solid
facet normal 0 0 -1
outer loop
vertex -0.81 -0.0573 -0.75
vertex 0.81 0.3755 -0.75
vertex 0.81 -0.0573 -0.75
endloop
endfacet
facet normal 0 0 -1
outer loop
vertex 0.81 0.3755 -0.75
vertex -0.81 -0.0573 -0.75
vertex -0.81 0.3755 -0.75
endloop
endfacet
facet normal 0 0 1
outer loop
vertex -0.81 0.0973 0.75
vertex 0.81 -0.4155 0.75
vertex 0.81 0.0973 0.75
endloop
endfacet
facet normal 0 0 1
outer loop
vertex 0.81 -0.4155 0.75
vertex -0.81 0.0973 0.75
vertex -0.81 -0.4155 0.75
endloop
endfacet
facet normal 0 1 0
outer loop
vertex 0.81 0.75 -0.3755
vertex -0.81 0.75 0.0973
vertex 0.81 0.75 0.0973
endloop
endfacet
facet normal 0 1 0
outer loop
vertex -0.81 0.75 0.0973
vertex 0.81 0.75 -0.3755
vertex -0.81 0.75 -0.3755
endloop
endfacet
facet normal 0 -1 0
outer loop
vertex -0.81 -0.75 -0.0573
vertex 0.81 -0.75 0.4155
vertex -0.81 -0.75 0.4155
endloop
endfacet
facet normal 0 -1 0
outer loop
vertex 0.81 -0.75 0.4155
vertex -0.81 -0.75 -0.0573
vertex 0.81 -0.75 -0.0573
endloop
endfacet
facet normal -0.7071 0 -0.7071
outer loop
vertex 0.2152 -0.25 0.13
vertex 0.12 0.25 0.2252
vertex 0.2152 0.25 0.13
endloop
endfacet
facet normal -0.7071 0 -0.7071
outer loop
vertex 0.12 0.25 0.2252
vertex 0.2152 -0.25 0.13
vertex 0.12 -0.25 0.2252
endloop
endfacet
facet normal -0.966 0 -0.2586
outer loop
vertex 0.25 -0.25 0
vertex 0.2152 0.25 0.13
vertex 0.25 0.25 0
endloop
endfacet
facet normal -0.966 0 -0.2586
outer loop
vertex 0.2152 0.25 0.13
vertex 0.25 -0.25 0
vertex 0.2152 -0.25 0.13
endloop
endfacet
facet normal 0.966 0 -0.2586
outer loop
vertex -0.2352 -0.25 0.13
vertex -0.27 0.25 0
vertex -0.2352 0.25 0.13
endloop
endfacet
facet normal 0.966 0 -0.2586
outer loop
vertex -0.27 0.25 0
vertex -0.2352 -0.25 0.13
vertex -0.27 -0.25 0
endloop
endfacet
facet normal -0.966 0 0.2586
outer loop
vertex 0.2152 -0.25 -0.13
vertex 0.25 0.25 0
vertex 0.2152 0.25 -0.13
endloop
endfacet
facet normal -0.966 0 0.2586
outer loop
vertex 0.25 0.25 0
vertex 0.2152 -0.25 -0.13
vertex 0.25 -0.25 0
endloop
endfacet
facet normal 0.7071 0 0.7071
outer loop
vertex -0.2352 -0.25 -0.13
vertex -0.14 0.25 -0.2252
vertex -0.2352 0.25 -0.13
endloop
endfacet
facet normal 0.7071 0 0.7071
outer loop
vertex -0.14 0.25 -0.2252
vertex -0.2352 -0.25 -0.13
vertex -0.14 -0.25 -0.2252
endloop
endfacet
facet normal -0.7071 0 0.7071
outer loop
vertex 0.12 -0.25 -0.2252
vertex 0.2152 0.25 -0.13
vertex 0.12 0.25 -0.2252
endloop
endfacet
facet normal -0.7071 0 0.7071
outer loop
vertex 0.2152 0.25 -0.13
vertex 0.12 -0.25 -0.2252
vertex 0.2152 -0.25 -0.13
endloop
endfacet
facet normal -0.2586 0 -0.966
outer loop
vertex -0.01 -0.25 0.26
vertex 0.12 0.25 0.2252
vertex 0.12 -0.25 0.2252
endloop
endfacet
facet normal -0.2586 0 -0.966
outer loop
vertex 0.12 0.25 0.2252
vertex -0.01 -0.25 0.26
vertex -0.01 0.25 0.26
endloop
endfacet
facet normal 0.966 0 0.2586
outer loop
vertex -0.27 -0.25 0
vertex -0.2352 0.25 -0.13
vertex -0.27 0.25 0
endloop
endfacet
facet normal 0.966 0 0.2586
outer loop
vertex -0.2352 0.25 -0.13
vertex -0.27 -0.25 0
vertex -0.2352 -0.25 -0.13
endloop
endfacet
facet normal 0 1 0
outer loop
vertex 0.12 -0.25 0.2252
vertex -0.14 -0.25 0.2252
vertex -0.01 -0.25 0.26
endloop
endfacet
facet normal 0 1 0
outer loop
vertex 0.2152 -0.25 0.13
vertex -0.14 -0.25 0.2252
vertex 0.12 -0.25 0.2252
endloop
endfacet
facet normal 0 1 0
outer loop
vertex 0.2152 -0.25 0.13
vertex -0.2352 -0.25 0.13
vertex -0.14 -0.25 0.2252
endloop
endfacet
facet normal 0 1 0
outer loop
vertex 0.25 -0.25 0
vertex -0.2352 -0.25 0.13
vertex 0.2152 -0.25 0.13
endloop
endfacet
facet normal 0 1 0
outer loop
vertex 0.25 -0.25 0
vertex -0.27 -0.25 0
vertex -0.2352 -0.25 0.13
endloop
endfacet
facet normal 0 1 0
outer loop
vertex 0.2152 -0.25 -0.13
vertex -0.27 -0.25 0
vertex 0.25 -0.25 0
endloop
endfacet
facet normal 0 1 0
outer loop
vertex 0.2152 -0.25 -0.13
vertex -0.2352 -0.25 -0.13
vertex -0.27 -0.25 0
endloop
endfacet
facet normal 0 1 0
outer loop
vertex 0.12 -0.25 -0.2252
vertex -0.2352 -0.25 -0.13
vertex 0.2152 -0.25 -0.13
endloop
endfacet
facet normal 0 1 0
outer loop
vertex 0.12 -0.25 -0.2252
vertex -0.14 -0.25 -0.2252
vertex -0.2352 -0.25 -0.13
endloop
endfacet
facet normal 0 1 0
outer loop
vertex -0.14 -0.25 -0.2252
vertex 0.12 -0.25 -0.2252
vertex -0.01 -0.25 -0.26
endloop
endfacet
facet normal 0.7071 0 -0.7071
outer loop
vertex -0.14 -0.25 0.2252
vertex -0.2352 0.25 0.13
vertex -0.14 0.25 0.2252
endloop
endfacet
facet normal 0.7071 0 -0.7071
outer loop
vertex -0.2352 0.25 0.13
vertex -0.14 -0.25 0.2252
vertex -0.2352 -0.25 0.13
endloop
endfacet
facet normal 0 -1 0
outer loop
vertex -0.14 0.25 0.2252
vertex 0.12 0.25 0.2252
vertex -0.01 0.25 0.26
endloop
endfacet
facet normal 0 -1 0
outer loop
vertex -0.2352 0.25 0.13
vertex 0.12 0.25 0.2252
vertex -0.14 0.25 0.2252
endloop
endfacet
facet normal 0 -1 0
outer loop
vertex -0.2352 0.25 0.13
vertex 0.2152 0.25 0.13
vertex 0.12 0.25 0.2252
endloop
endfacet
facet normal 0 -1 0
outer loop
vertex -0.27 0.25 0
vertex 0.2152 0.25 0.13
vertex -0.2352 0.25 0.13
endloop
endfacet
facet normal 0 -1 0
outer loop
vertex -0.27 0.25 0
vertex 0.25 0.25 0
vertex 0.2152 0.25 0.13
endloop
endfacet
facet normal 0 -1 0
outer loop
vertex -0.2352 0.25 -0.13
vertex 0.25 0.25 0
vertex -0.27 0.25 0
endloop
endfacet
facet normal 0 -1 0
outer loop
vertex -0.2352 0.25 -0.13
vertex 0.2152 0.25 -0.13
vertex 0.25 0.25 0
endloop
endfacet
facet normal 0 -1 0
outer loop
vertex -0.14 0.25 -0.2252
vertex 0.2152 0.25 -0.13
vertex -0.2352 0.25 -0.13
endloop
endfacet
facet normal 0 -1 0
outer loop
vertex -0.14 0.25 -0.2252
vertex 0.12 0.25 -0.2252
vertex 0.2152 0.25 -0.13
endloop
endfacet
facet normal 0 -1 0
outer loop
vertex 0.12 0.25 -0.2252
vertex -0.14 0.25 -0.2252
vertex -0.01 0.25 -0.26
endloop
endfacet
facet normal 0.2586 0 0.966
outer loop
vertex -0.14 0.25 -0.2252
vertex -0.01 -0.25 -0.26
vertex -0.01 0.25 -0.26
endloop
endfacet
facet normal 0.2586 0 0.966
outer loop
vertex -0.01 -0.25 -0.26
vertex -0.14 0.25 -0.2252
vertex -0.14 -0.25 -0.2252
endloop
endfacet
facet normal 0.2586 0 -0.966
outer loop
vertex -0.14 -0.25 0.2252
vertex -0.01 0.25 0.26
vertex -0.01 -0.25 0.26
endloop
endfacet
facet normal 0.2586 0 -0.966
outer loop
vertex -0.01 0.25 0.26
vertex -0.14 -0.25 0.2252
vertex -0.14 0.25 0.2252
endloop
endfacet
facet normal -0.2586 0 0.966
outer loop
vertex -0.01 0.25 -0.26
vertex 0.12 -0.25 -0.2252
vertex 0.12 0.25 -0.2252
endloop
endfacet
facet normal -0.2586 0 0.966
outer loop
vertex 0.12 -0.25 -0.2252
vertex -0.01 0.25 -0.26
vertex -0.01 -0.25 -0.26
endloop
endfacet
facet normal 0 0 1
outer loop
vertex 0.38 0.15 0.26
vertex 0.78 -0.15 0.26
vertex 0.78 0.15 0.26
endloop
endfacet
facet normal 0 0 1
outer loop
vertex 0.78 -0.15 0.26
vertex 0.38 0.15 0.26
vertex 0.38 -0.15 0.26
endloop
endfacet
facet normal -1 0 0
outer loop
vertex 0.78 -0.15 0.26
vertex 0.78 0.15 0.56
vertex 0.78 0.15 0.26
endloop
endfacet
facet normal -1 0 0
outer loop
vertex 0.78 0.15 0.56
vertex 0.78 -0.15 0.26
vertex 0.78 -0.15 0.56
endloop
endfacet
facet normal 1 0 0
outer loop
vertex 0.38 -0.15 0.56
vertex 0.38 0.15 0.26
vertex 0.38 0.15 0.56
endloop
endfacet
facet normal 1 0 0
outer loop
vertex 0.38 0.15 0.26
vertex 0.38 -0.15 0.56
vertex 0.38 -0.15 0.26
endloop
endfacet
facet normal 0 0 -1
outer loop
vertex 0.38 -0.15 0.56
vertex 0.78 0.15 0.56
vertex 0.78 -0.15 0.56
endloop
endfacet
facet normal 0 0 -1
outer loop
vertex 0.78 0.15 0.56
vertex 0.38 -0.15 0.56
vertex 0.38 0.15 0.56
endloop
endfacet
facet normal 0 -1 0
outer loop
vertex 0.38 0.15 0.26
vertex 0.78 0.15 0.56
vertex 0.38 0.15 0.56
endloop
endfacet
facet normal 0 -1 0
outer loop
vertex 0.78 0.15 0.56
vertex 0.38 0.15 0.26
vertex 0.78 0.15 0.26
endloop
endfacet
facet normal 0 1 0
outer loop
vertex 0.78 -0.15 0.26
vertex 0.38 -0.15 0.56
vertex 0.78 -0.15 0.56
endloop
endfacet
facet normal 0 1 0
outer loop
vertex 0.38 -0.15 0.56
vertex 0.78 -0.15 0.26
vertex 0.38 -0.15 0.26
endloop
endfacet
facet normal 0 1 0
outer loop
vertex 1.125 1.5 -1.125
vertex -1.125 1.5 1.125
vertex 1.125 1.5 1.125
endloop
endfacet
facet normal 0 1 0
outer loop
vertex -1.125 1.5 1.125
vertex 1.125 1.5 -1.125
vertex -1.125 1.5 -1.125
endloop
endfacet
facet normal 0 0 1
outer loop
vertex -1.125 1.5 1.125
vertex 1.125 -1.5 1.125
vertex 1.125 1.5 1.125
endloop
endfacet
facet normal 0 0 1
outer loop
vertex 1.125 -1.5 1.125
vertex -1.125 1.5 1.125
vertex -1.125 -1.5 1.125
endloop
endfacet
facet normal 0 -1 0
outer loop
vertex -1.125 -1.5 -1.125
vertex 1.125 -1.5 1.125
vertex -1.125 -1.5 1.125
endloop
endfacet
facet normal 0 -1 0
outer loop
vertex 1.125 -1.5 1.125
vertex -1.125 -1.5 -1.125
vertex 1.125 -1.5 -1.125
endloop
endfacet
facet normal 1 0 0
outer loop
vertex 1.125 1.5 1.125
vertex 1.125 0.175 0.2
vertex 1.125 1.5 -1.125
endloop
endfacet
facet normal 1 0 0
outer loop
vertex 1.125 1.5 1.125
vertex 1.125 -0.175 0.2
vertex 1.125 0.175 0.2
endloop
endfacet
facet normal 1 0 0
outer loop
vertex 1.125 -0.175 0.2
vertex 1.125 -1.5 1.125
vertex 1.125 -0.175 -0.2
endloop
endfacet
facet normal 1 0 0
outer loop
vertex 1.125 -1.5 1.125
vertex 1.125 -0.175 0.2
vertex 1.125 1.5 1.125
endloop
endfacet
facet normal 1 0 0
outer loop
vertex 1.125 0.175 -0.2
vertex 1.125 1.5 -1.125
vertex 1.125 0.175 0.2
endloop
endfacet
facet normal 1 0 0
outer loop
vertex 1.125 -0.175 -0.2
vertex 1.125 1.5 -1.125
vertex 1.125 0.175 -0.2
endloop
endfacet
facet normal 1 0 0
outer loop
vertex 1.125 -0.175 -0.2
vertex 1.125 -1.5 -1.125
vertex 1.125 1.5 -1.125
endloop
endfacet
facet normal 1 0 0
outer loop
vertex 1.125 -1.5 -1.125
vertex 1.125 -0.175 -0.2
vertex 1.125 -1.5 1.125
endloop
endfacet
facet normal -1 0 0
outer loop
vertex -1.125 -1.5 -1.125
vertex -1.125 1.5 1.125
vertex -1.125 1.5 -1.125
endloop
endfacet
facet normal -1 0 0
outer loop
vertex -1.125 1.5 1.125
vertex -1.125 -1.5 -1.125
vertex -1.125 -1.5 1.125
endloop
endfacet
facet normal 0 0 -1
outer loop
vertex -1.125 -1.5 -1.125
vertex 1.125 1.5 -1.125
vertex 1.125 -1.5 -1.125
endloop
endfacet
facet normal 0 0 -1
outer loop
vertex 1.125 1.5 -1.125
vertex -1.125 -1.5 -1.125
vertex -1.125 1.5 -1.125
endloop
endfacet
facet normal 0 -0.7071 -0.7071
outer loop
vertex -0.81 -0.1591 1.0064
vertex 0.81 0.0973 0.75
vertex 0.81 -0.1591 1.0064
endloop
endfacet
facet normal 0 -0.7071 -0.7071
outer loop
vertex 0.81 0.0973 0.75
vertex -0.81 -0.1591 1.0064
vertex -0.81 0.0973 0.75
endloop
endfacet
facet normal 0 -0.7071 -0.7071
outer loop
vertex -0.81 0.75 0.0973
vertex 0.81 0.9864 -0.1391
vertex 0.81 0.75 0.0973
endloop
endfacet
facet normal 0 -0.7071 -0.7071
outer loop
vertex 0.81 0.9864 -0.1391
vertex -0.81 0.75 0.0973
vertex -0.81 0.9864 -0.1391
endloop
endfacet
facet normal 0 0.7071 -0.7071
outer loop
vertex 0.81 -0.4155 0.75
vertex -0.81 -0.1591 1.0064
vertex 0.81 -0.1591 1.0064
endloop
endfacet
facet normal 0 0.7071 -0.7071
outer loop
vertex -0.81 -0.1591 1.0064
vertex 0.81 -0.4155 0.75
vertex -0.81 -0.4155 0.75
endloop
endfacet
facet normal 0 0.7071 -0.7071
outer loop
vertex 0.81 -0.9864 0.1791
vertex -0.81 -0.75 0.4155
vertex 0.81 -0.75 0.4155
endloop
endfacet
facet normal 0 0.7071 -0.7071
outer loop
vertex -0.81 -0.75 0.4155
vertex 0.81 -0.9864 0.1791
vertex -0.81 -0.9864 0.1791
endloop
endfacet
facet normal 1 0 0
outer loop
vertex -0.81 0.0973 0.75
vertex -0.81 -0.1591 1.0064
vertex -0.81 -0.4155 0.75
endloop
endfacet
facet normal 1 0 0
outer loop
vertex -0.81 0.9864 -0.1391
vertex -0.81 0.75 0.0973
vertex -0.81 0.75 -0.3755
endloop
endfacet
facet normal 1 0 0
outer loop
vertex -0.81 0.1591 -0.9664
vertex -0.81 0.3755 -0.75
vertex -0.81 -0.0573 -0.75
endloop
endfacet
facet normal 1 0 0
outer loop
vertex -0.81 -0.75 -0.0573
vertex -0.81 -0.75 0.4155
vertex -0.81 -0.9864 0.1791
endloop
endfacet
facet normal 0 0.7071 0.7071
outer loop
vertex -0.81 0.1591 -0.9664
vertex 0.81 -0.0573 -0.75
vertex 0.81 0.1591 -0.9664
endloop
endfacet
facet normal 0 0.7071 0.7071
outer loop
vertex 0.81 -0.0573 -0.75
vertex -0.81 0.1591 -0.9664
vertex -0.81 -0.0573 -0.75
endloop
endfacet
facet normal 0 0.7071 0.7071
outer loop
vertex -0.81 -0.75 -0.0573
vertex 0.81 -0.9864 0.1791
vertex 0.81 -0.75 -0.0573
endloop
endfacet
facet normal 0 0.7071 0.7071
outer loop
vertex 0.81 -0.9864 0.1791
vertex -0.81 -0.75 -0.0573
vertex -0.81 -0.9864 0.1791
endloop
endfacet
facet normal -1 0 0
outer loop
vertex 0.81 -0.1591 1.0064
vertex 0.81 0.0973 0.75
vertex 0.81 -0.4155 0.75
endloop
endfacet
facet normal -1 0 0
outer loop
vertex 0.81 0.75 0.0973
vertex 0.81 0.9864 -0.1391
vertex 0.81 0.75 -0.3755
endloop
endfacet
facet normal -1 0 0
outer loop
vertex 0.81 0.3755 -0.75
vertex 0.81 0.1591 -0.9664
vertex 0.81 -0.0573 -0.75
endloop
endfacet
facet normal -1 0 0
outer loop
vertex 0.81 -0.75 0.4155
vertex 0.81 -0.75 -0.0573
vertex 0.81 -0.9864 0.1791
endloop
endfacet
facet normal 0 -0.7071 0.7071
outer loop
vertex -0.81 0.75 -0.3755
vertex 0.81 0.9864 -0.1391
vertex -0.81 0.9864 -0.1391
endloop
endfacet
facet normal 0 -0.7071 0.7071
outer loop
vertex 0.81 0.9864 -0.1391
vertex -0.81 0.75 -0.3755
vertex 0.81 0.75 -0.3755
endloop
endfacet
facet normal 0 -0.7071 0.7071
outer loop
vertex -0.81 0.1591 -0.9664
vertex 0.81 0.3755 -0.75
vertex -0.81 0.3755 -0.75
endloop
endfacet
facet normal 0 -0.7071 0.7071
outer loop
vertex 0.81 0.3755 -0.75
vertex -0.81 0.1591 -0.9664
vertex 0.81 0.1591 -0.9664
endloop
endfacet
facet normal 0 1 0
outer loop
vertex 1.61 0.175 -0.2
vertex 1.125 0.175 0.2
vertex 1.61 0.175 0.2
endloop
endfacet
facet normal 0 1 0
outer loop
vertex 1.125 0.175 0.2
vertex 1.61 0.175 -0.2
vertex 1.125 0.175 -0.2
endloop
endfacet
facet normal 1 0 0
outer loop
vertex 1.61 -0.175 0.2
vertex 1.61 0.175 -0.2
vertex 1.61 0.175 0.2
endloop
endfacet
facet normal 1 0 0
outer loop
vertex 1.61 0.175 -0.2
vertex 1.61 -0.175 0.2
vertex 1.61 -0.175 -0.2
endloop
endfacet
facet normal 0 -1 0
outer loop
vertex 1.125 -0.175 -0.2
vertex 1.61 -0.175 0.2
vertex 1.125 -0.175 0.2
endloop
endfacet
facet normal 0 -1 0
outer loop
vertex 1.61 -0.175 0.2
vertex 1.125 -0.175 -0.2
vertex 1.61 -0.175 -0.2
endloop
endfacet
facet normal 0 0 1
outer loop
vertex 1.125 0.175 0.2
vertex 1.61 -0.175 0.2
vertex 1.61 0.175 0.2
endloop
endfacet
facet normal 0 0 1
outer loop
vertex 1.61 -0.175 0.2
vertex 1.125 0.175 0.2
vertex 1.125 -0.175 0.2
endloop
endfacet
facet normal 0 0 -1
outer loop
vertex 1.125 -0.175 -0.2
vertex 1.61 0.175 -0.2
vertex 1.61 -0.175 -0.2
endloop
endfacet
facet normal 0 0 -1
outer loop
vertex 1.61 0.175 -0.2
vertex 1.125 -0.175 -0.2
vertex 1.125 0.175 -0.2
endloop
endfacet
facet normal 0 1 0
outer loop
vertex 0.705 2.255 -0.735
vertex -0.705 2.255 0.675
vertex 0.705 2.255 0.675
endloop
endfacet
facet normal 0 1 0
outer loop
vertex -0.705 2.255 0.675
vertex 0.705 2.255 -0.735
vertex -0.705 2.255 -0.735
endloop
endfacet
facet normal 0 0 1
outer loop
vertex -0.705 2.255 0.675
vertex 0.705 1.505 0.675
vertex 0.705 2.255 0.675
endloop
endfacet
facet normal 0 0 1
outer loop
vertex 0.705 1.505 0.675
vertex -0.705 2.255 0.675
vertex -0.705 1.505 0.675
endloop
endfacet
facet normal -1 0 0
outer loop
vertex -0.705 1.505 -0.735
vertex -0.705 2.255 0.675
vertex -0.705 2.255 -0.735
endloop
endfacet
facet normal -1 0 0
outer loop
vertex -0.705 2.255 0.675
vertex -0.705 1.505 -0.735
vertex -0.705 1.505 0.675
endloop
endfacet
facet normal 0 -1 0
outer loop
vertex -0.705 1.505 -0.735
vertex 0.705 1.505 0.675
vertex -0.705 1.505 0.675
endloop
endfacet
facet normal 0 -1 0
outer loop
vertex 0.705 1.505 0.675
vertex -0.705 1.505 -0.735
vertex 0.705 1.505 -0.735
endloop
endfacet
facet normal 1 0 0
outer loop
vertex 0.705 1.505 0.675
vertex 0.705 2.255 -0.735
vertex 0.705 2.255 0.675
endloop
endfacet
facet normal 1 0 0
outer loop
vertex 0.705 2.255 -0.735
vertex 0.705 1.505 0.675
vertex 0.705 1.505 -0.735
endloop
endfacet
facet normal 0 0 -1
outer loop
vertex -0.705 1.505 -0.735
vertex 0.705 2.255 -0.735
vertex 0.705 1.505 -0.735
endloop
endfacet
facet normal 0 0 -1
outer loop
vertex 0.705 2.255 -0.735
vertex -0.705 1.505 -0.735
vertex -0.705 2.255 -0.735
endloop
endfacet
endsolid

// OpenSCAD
translate([1.04,0.0,0.0]){
	rotate([90,0,90.0]){
		cube([0.35,0.4,1.14], center = true);
	}
}
difference() {
	difference() {
	translate([0.0,0,0.0]){
	rotate([0,90.0,0]){
		cube([1.5,1.5,2.0], center = true);
	}
}

	translate([-0.01,0,0.0]){
	rotate([90,0,0]){
		cylinder($fn = 12, h = 0.5, r1 = 0.26, r2 = 0.26, center = true);
	}
}
}

	translate([0.58,0,0.41]){
	rotate([0,90.0,0]){
		cube([0.3,0.3,0.4], center = true);
	}
}
}
difference() {
	difference() {
	translate([0,0.0,0.0]){
	rotate([0,90.0,90]){
		cube([2.25,2.25,3.0], center = true);
	}
}

	translate([0,0.0,0.02]){
	rotate([0,45.0,90]){
		cube([1.62,1.62,1.17], center = true);
	}
}
}

	translate([0,-0.1,-0.04]){
	rotate([0,90,0]){
		cylinder($fn = 3, h = 0.64, r1 = 0.42, r2 = 0.42, center = true);
	}
}
}
translate([0,1.88,-0.03]){
	rotate([0,90.0,90]){
		cube([1.41,1.41,0.75], center = true);
	}
}
